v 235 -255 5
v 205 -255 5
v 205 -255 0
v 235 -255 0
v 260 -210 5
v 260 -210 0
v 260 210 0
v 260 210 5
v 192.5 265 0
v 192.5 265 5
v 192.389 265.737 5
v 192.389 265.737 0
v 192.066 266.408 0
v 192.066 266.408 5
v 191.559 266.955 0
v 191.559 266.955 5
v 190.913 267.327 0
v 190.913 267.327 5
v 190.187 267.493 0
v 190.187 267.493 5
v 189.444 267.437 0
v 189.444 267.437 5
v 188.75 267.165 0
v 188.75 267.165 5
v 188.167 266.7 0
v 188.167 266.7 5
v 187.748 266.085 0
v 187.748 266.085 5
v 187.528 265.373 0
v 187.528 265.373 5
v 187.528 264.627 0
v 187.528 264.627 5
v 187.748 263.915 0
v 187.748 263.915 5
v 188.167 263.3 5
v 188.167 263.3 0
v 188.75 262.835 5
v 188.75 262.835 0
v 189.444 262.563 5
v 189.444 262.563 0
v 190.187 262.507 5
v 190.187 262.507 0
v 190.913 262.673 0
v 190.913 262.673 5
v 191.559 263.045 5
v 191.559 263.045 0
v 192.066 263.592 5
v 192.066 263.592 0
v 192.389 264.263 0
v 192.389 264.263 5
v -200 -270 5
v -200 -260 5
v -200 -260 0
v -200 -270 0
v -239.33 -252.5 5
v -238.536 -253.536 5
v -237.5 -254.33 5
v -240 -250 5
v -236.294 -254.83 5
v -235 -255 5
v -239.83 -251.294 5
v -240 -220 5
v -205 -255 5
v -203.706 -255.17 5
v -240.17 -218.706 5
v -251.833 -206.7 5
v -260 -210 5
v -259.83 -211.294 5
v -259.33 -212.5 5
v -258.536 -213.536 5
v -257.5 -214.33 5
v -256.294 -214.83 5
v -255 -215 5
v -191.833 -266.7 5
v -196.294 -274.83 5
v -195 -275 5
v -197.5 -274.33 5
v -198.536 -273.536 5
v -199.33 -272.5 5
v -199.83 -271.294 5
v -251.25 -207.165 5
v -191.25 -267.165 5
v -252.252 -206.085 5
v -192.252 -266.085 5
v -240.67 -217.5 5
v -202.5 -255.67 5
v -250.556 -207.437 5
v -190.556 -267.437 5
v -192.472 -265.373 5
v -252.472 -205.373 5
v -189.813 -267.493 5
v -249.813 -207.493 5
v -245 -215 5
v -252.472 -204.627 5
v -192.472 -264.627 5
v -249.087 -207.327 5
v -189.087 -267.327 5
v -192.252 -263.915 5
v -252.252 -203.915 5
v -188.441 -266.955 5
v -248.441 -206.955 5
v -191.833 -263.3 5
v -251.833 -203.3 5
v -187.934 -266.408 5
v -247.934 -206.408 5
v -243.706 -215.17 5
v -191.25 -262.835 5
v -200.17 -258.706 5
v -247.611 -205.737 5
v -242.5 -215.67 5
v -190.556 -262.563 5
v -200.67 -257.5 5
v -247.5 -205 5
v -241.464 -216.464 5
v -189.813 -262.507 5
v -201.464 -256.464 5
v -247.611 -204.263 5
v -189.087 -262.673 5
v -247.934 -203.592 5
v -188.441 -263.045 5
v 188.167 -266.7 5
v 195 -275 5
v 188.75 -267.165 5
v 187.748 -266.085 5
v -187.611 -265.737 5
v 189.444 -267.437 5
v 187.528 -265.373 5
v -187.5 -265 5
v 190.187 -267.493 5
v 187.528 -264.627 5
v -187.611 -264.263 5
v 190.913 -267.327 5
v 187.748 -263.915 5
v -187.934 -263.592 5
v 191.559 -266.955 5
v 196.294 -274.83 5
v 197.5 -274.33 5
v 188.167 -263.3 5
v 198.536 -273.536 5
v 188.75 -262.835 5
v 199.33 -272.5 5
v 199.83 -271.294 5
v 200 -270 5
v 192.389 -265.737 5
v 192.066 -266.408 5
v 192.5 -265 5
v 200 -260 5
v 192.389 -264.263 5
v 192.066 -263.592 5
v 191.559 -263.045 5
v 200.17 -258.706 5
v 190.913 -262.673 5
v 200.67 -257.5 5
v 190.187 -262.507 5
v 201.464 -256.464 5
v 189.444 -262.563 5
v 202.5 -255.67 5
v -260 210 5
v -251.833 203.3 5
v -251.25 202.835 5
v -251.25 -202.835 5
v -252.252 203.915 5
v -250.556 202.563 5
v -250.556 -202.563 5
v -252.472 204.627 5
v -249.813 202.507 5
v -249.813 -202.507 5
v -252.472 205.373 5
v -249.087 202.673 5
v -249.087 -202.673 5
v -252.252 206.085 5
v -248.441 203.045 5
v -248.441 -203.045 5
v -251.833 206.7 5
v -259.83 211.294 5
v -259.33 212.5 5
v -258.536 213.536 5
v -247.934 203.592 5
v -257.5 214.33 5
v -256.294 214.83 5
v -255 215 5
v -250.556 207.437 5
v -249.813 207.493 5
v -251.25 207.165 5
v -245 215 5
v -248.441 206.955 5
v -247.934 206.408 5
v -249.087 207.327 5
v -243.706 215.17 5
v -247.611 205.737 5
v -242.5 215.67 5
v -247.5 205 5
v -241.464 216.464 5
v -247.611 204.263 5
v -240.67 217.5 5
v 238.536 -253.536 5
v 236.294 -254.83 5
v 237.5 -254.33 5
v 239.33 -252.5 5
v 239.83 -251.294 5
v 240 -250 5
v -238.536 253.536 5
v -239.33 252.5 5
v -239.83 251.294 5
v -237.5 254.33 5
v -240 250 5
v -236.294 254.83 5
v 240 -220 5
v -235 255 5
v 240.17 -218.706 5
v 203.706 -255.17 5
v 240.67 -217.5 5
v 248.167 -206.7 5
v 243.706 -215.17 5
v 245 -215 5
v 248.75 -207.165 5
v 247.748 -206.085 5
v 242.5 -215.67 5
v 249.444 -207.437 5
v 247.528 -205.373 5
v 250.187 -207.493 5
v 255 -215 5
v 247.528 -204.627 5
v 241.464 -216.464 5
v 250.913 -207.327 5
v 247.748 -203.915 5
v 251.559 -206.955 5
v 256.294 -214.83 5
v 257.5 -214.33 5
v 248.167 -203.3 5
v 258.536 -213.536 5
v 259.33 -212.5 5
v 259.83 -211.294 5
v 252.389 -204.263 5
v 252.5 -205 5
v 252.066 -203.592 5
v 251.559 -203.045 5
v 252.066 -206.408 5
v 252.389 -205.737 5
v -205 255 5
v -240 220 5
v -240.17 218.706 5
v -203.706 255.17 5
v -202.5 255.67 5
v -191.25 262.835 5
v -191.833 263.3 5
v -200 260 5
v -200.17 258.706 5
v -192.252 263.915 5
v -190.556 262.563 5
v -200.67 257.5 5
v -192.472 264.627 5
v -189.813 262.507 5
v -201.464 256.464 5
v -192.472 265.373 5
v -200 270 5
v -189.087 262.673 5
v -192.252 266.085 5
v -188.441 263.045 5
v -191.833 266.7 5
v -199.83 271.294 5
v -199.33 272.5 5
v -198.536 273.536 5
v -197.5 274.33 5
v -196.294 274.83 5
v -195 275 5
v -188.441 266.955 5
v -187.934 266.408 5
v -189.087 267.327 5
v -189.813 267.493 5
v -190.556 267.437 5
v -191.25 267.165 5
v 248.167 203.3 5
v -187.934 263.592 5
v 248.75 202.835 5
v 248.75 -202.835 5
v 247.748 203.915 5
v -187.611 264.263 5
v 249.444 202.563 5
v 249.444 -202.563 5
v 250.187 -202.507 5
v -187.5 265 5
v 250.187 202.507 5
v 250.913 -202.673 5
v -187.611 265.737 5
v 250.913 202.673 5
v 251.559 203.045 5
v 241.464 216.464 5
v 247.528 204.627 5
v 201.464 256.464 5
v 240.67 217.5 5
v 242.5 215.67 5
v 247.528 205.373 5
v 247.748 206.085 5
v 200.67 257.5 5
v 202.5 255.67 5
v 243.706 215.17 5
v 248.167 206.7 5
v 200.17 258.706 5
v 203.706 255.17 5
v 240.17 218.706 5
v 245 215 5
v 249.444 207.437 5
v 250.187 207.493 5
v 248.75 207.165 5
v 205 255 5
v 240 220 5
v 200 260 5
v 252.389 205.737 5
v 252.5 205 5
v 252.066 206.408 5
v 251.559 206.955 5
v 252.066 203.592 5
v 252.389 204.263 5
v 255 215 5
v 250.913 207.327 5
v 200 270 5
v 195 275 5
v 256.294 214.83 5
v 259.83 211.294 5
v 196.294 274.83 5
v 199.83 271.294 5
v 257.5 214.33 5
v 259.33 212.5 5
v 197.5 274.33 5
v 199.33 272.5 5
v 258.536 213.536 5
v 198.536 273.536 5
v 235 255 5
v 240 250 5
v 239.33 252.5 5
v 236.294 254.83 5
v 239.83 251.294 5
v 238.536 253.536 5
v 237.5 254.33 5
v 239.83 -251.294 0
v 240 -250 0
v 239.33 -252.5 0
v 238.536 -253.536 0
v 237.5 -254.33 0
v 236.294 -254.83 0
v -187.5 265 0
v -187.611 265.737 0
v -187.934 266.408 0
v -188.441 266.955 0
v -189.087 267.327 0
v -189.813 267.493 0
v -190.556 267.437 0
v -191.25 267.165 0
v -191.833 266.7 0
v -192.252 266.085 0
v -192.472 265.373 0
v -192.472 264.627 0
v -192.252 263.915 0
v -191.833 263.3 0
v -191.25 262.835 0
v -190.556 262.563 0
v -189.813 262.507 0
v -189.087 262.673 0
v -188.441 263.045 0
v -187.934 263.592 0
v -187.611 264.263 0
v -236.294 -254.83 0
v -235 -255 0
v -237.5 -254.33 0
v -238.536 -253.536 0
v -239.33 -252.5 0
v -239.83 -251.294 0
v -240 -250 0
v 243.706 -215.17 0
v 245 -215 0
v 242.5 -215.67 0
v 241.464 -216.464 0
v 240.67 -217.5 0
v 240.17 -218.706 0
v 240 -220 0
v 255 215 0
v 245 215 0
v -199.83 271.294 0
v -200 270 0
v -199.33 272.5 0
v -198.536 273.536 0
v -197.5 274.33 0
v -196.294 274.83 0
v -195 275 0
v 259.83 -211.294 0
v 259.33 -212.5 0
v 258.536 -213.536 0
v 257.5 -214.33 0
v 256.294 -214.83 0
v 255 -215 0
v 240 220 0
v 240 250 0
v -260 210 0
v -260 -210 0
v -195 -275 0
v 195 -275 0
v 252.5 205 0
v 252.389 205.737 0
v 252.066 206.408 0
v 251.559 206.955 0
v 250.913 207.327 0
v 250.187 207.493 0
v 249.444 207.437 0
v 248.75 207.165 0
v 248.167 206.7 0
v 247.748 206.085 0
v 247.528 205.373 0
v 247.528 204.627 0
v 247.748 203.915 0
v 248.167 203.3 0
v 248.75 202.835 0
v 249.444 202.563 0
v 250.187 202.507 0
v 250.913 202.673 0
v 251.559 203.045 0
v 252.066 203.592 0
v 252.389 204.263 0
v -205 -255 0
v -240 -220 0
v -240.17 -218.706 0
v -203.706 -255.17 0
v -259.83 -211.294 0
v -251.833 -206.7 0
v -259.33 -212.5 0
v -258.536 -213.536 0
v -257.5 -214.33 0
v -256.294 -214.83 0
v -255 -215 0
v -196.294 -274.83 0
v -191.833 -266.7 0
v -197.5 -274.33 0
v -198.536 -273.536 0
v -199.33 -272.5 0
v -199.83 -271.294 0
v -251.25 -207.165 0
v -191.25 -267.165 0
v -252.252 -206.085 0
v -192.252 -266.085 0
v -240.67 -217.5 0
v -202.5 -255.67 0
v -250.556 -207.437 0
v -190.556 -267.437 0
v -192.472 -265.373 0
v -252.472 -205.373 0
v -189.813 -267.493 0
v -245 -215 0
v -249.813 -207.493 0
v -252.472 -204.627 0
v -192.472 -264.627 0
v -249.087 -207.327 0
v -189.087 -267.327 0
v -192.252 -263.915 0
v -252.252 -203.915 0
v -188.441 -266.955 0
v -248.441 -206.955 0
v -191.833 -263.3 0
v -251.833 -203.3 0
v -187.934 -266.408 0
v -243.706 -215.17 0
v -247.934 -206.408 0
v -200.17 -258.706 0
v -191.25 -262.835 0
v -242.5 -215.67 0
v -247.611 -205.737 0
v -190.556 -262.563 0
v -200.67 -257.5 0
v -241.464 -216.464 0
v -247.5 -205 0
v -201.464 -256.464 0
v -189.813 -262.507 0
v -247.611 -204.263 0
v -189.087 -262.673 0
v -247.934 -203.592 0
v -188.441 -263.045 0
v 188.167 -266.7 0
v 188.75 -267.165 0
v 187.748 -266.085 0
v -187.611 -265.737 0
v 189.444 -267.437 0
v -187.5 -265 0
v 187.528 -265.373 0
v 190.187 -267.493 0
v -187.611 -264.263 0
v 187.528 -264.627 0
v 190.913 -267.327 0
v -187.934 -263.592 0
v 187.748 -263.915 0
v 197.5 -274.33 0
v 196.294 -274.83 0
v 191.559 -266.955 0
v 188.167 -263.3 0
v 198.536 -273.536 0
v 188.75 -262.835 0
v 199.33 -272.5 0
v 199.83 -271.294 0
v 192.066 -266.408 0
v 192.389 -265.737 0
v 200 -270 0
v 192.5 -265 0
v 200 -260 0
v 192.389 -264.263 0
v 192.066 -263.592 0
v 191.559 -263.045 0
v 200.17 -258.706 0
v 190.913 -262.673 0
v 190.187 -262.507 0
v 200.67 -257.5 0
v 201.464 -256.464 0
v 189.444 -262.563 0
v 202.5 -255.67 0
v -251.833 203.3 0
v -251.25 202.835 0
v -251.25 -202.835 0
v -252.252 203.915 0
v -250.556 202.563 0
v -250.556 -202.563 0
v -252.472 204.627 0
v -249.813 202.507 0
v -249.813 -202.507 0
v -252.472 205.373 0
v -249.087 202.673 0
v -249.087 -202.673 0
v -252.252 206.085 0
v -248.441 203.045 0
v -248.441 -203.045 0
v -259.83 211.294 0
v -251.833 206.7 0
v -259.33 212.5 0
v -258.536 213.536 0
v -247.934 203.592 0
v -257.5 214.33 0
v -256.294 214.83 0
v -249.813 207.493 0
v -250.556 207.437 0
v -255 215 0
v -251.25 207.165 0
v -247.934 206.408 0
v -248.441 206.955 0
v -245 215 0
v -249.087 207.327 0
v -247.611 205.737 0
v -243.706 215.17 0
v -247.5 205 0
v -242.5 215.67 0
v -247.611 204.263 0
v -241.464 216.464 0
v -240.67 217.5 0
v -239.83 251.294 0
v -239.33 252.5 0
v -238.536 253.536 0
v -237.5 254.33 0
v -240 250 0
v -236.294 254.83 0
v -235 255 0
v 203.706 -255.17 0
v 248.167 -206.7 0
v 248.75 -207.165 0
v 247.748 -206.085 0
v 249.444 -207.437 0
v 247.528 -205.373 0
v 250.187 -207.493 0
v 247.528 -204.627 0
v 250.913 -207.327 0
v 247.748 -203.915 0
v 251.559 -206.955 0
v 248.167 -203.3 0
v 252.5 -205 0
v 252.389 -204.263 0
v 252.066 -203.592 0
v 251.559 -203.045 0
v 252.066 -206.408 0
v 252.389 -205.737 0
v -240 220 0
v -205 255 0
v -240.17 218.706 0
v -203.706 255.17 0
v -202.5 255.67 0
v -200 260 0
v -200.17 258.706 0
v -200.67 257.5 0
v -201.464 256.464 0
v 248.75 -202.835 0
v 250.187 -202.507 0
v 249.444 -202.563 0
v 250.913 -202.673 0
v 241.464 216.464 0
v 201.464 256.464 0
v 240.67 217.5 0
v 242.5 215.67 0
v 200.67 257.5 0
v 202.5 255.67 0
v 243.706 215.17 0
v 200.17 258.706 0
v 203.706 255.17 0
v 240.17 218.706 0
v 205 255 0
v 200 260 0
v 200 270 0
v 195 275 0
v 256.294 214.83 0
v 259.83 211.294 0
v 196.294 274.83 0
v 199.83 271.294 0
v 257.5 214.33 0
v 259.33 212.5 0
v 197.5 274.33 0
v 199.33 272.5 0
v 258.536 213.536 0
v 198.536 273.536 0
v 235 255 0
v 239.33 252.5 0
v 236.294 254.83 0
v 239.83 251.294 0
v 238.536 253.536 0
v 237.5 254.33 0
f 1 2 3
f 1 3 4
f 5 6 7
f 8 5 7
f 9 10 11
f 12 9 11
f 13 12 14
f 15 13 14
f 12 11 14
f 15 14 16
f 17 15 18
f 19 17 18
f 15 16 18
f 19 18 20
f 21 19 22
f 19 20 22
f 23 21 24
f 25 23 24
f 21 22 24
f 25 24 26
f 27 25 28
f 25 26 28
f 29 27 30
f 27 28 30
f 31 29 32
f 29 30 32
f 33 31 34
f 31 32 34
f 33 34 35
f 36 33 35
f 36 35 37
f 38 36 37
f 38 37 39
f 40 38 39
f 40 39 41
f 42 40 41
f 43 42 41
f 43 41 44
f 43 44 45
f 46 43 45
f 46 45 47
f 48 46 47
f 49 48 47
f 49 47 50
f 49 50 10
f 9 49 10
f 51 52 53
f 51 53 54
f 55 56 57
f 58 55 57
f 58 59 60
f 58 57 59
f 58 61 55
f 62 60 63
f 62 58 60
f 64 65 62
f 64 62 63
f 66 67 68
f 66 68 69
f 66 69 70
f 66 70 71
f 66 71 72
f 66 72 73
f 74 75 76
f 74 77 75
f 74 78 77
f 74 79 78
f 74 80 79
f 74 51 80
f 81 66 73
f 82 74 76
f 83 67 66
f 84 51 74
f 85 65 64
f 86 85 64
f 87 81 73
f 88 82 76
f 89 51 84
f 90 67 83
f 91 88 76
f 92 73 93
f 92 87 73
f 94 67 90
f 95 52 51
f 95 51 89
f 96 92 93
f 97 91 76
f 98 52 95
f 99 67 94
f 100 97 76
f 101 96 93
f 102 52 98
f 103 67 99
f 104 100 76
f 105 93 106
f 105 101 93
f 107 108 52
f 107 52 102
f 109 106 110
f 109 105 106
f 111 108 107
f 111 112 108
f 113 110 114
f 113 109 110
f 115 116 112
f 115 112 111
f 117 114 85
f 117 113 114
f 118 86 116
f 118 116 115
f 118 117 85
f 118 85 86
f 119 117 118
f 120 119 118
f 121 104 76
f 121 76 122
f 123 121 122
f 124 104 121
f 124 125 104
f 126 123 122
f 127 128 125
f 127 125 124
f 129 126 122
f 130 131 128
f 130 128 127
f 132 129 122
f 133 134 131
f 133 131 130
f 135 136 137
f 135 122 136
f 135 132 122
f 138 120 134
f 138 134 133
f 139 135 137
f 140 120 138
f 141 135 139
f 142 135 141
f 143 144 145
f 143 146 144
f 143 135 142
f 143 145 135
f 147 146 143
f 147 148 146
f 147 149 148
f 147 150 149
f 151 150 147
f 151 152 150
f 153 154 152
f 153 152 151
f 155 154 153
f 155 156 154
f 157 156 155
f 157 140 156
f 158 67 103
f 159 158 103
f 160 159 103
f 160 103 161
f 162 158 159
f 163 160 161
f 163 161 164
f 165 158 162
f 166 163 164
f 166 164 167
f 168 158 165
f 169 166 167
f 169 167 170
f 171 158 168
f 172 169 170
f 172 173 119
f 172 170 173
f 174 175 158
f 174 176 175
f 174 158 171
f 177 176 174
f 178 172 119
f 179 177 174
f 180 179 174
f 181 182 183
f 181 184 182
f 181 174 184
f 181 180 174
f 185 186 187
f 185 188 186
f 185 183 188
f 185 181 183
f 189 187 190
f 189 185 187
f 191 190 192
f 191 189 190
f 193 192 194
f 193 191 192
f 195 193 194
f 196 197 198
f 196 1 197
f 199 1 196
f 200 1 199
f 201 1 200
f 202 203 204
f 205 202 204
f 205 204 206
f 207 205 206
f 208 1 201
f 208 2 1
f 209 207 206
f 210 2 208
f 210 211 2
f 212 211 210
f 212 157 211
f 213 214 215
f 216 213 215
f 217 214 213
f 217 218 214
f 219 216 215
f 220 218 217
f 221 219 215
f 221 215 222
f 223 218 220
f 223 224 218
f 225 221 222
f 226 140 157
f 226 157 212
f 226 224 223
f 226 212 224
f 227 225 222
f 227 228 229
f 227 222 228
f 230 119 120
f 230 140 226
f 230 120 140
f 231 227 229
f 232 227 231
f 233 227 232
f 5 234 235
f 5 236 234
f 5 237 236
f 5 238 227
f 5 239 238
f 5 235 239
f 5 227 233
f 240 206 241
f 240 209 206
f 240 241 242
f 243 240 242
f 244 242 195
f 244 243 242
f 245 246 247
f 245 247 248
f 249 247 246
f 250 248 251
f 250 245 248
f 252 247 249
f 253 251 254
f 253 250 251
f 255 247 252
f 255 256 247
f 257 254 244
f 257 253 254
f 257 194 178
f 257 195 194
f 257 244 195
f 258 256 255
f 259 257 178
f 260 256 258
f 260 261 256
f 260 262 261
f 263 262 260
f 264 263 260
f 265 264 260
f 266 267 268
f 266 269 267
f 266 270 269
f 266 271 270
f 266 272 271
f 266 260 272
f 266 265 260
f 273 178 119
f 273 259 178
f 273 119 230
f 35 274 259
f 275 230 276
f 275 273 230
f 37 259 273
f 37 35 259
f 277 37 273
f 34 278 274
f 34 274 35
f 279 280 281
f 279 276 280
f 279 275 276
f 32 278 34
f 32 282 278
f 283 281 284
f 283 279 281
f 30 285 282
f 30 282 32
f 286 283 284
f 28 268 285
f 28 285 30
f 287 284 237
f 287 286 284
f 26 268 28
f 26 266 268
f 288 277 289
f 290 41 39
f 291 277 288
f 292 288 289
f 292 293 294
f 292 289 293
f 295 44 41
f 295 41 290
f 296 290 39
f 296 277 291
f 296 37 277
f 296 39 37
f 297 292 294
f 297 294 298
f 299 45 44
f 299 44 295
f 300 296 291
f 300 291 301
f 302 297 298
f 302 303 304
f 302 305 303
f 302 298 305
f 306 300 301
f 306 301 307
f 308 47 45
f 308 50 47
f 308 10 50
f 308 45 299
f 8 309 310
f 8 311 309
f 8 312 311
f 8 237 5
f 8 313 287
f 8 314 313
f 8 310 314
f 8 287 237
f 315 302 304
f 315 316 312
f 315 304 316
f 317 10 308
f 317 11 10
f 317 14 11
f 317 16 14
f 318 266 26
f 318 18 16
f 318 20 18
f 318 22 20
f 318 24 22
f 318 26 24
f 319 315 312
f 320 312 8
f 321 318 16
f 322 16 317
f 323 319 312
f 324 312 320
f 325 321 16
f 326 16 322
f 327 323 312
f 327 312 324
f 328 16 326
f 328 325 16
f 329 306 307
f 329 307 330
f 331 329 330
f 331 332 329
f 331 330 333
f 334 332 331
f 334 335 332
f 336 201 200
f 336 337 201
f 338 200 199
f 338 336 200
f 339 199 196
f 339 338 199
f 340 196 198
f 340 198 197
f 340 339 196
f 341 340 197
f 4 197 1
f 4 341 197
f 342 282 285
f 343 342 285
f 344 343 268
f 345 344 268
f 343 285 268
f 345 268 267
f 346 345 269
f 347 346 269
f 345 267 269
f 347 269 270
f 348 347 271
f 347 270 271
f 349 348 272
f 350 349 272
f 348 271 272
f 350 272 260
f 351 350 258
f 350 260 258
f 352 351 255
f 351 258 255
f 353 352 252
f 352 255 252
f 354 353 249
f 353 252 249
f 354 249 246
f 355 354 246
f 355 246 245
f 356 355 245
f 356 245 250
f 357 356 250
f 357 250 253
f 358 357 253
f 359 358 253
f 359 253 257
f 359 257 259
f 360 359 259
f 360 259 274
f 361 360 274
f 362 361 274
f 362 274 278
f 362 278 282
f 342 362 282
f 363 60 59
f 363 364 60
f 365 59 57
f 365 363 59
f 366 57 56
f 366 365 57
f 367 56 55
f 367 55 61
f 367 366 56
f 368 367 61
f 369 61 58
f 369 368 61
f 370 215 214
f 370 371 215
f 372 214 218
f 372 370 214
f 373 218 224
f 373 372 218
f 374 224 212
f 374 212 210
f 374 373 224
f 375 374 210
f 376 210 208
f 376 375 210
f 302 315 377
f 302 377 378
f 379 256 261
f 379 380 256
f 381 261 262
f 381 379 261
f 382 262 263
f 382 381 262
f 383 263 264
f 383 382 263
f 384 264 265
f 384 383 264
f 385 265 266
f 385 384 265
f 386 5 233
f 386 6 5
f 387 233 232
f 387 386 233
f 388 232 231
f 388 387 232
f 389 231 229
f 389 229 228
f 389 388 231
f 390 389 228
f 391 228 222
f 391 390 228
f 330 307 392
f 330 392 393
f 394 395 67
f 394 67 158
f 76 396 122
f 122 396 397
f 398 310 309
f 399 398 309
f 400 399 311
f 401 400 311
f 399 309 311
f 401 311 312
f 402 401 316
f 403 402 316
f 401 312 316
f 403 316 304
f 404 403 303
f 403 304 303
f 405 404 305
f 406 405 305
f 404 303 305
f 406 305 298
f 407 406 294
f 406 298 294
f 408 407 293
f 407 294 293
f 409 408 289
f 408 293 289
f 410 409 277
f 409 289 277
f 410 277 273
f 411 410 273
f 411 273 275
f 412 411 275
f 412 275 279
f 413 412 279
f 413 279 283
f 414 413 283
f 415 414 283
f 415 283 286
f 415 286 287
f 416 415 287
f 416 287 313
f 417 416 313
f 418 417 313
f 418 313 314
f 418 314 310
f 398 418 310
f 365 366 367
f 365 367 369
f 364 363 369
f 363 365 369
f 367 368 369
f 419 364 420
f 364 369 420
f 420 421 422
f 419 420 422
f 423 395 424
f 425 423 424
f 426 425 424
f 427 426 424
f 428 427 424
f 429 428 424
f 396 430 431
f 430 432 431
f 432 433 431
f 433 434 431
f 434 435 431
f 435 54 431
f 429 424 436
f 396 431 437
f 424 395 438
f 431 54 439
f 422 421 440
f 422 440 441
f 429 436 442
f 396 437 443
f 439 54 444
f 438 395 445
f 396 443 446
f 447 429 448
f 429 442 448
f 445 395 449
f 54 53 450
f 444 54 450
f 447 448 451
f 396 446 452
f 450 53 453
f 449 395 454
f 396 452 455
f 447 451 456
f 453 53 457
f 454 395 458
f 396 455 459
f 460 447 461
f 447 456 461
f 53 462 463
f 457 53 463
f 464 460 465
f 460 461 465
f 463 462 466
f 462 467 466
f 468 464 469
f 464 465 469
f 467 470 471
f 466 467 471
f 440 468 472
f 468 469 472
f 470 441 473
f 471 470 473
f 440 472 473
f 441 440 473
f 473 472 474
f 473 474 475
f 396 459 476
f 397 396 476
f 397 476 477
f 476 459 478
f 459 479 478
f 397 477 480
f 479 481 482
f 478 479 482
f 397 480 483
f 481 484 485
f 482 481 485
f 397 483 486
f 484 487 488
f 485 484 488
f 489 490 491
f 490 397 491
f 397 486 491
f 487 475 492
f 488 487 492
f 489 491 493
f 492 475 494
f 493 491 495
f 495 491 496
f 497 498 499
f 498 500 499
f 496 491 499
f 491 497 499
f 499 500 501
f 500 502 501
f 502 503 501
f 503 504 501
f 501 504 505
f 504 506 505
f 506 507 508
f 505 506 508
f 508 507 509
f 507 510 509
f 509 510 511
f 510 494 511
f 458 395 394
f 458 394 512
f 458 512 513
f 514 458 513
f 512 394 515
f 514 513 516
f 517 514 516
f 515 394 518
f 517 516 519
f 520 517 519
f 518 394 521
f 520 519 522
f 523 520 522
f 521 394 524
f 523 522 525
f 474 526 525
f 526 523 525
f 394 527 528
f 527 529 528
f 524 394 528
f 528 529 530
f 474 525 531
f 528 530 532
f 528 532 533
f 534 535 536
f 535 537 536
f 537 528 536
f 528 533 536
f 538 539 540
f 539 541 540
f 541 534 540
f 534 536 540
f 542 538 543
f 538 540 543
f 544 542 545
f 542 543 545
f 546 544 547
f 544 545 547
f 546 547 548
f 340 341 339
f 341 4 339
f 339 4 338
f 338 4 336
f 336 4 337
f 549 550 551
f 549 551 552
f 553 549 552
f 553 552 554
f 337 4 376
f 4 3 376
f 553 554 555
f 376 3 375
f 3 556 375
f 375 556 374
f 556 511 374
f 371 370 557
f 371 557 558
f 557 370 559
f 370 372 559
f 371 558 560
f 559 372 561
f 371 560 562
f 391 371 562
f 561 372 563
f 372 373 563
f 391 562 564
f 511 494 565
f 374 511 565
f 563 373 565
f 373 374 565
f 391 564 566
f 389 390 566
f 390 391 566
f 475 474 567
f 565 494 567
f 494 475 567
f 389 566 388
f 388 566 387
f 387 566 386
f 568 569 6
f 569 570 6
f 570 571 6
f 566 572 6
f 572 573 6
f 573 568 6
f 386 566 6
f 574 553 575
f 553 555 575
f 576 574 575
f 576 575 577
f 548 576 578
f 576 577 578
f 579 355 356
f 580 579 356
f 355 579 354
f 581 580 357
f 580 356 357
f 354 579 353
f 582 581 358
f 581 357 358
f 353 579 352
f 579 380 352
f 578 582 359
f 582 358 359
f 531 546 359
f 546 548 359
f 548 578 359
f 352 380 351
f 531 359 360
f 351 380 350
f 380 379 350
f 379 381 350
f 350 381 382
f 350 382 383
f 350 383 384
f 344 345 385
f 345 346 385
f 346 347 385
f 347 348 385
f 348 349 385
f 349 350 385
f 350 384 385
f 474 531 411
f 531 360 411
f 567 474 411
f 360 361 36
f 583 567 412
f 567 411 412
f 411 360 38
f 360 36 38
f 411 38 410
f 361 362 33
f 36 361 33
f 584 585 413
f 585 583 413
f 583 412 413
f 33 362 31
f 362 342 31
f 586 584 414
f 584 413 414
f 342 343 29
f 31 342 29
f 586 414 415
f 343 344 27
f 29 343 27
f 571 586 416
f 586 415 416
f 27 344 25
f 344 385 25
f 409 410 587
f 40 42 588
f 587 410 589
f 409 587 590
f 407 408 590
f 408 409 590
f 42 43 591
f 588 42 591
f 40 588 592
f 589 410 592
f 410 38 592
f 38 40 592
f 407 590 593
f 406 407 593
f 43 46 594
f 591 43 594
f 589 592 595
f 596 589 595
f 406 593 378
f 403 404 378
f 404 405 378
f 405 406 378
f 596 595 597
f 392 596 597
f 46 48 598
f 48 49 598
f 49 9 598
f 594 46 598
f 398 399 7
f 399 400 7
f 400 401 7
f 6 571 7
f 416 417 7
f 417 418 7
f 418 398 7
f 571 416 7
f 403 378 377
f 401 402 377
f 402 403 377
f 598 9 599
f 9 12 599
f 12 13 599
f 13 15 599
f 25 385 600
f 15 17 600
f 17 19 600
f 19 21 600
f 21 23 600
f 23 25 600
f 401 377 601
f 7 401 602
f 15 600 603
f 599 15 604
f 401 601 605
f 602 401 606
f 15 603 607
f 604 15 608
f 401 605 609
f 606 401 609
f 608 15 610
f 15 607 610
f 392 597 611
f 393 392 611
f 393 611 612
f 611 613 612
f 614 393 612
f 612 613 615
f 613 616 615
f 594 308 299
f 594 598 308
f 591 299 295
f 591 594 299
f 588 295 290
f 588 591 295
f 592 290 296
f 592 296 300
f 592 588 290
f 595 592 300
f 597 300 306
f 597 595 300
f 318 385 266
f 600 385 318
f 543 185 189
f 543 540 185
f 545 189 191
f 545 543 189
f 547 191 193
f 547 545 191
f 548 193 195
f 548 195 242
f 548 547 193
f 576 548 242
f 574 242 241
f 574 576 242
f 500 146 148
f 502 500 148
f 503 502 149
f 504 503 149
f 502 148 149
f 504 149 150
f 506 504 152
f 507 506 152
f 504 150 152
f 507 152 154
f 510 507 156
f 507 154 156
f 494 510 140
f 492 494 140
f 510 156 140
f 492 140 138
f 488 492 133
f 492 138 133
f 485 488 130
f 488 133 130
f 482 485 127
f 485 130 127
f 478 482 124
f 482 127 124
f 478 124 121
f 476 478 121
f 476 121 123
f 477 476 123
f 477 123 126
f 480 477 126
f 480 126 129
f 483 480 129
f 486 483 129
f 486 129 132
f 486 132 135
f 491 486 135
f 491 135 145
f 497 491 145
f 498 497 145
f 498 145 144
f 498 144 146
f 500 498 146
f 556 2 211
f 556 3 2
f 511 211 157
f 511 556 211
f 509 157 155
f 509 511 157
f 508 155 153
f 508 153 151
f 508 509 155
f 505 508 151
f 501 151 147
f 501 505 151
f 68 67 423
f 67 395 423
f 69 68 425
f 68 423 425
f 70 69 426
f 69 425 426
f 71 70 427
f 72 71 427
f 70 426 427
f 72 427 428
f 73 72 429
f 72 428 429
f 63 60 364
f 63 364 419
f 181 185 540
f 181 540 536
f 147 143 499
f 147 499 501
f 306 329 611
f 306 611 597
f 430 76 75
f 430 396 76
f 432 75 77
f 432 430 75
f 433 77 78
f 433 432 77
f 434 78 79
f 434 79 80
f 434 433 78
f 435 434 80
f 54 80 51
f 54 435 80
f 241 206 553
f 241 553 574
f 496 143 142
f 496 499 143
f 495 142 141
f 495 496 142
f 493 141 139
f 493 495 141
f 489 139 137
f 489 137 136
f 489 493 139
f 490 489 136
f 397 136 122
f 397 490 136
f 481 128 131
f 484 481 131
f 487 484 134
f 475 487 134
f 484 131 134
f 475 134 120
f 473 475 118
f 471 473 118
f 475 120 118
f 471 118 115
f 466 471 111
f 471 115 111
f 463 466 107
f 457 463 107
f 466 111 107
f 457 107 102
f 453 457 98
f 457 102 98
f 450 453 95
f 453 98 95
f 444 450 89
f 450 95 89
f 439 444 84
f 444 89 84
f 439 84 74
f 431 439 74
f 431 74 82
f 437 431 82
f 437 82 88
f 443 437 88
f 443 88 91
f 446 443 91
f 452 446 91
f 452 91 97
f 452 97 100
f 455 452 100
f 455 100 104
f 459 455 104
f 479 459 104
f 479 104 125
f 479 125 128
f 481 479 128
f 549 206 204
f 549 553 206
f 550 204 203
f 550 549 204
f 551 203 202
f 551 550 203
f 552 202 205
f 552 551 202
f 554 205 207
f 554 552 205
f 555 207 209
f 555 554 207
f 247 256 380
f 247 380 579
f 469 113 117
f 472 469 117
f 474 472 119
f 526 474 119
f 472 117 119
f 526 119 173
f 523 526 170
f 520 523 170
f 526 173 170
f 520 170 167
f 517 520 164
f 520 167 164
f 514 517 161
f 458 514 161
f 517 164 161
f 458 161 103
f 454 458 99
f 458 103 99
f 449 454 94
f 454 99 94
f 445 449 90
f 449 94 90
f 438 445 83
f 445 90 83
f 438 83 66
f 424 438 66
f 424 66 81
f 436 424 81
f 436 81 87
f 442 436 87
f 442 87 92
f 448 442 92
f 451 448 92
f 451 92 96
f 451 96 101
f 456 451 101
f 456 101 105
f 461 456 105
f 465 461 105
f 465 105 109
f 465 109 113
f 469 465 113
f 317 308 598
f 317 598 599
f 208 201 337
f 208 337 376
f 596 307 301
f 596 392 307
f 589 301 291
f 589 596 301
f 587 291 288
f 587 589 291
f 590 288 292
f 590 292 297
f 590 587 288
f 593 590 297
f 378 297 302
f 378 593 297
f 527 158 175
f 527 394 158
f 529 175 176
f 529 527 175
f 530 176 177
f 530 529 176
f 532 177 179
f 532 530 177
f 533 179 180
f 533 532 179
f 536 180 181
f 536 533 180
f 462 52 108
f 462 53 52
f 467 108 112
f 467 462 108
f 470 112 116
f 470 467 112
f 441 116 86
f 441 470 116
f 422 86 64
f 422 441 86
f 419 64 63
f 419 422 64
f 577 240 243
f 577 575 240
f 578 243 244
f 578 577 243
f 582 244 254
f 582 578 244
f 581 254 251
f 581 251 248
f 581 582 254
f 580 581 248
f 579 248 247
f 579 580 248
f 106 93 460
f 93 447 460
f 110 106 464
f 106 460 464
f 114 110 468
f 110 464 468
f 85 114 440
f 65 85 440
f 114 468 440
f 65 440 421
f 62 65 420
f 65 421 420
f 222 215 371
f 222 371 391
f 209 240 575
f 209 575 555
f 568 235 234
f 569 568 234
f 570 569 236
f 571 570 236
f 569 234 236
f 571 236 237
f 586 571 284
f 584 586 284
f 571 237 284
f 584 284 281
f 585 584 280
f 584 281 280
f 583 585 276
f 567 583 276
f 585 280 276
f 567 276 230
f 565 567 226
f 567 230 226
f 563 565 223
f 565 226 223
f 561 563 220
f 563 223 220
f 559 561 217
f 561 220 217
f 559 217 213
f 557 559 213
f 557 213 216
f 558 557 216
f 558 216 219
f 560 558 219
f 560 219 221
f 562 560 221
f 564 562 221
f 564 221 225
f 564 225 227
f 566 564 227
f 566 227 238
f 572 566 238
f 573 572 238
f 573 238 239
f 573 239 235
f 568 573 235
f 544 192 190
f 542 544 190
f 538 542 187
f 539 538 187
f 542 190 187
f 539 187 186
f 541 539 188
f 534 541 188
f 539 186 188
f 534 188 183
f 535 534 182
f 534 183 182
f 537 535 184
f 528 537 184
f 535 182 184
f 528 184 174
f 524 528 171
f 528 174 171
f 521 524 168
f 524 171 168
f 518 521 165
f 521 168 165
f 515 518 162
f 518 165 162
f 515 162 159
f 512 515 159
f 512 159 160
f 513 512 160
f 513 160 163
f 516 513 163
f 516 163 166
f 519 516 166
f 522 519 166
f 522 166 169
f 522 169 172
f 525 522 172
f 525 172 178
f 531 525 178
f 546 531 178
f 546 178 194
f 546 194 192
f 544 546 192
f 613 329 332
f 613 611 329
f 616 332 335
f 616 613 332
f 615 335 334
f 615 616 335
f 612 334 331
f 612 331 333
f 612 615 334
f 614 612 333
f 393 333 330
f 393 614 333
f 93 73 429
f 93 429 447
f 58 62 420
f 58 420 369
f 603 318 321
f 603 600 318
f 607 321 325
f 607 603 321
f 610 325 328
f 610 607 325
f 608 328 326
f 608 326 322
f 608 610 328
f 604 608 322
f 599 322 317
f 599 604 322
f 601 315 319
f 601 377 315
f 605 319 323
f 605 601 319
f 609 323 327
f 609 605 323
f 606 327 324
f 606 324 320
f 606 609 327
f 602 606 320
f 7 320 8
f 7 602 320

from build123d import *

# Parameters (mm, degrees)
SKETCH_1_W          = 520
SKETCH_1_H          = 550
EXTRUDE_1_DEPTH     = 5
SKETCH_2_R          = 2.5
CUT_EXTRUDE_2_DEPTH = 379.483817356
FILLET_2_R          = 5


with BuildPart() as part:
    # 草图1 → 凸台-拉伸1 (new body)
    with BuildSketch(Plane.XY):
        Rectangle(SKETCH_1_W, SKETCH_1_H)
    extrude(amount=EXTRUDE_1_DEPTH)

    # 草图2 → 切除-拉伸2 (cut, through all)
    with BuildSketch(Plane.XY.offset(5)):
        with Locations((-190, 265)):
            Circle(SKETCH_2_R)
        with Locations((190, 265)):
            Circle(SKETCH_2_R)
        with Locations((250, 205)):
            Circle(SKETCH_2_R)
        with Locations((-250, 205)):
            Circle(SKETCH_2_R)
        with Locations((-250, -205)):
            Circle(SKETCH_2_R)
        with Locations((-190, -265)):
            Circle(SKETCH_2_R)
        with Locations((190, -265)):
            Circle(SKETCH_2_R)
        with Locations((250, -205)):
            Circle(SKETCH_2_R)
        Polygon((240, 255), (200, 255), (200, 275), (260, 275), (260, 215), (240, 215), align=None)
        Polygon((-240, 255), (-240, 215), (-260, 215), (-260, 275), (-200, 275), (-200, 255), align=None)
        Polygon((-240, -255), (-200, -255), (-200, -275), (-260, -275), (-260, -215), (-240, -215), align=None)
        Polygon((240, -255), (240, -215), (260, -215), (260, -275), (200, -275), (200, -255), align=None)
    extrude(amount=-CUT_EXTRUDE_2_DEPTH, mode=Mode.SUBTRACT)

    # 圆角2
    fillet_2_edges = [part.edges().sort_by_distance(p)[0] for p in [
        (260, 215, 2.5),
        (240, 215, 2.5),
        (240, 255, 2.5),
        (200, 255, 2.5),
        (200, 275, 2.5),
        (-200, 275, 2.5),
        (-200, 255, 2.5),
        (-240, 255, 2.5),
        (-240, 215, 2.5),
        (-260, 215, 2.5),
        (-260, -215, 2.5),
        (-240, -215, 2.5),
        (-240, -255, 2.5),
        (-200, -255, 2.5),
        (-200, -275, 2.5),
        (200, -275, 2.5),
        (200, -255, 2.5),
        (240, -255, 2.5),
        (240, -215, 2.5),
        (260, -215, 2.5),
    ]]
    fillet(fillet_2_edges, radius=FILLET_2_R)


solid = part.part
